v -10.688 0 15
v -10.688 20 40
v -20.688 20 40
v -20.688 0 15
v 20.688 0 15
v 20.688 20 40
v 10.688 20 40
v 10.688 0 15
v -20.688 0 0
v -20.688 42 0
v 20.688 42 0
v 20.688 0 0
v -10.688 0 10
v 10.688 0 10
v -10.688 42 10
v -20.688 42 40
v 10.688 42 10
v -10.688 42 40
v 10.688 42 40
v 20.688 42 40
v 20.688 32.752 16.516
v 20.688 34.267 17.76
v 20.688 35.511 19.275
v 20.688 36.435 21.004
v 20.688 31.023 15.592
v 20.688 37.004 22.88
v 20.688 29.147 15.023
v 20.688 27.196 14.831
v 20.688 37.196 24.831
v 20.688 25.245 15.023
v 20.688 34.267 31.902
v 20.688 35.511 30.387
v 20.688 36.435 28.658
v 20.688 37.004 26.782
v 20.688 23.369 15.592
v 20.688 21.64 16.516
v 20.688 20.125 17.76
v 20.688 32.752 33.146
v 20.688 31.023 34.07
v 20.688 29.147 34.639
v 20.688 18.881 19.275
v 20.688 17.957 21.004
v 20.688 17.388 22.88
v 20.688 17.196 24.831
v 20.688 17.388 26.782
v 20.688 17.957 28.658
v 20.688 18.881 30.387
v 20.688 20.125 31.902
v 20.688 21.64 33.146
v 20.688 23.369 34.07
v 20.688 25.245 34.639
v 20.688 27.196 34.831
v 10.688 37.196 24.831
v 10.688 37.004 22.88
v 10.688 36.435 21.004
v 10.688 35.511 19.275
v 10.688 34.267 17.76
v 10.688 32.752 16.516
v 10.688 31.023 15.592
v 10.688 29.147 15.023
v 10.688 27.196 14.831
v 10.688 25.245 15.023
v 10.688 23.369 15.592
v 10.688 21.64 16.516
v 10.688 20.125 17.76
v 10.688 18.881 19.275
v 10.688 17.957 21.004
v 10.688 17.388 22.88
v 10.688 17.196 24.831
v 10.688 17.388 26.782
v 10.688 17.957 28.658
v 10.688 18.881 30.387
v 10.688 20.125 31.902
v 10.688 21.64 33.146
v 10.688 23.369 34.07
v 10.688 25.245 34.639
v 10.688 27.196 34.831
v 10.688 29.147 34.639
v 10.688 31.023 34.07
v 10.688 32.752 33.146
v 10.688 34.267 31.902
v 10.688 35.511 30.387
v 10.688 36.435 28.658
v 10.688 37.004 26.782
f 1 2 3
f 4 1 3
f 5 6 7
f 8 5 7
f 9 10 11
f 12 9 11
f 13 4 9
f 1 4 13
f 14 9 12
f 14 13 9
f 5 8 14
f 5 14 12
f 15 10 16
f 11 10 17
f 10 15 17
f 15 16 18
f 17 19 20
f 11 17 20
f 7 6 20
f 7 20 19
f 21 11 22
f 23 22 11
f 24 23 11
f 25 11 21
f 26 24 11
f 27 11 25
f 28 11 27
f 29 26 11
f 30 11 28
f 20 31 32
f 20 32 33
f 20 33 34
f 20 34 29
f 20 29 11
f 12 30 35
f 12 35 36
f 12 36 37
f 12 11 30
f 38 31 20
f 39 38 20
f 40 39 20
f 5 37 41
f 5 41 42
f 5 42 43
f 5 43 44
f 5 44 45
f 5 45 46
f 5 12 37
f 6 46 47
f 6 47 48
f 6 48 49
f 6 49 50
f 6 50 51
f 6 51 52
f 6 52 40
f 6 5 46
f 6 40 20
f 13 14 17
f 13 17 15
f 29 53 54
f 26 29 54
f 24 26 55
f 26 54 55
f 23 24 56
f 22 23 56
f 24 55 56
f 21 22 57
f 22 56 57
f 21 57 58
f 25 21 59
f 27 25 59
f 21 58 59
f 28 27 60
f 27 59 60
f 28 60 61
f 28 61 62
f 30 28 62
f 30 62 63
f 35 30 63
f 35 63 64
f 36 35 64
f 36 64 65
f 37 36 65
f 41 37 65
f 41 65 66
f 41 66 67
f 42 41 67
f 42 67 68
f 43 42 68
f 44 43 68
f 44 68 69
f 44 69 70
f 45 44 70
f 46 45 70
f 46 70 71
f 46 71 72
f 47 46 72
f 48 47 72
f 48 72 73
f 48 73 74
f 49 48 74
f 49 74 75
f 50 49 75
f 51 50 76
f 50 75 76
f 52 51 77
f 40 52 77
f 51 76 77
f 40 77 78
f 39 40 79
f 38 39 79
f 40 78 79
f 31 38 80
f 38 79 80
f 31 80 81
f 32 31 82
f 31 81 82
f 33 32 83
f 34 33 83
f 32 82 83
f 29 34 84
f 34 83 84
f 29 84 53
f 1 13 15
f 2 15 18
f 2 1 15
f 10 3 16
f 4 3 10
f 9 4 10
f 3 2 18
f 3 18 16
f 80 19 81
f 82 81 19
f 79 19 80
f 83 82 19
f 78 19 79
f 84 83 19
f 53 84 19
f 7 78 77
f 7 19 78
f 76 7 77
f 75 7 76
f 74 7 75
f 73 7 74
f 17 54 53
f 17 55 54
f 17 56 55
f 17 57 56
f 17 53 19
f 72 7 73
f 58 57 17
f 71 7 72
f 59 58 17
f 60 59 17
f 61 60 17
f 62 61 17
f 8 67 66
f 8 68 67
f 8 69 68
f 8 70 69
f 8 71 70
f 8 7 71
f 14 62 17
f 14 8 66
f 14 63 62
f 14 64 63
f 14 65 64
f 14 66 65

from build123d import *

# Parameters (mm, degrees)
F1_DEPTH   = 42
F3_SIZE2   = 25
F3_SIZE    = 20
F3_2_SIZE2 = 25
F3_2_SIZE  = 20
F4_D       = 20
F4_DEPTH   = 20.6886382592


with BuildPart() as f1:
    # F0 (on Front) → F1 (new body)
    with BuildSketch(Plane.XZ):
        Polygon((-20.6876382592, 40), (-20.6876382592, 0), (20.6876382592, 0), (20.6876382592, 40), (10.6876382592, 40), (10.6876382592, 10), (-10.6876382592, 10), (-10.6876382592, 40), align=None)
    extrude(amount=-F1_DEPTH)

    # F3
    f3_edges = [f1.edges().sort_by_distance(p)[0] for p in [
        (-15.687638, 0, 40),
    ]]
    f3_side = f1.faces().sort_by_distance((-15.687638, 21, 40))[0]
    chamfer(f3_edges, length=F3_SIZE, length2=F3_SIZE2, reference=f3_side)

    # F3#2
    f3_2_edges = [f1.edges().sort_by_distance(p)[0] for p in [
        (15.687638, 0, 40),
    ]]
    f3_2_side = f1.faces().sort_by_distance((15.687638, 21, 40))[0]
    chamfer(f3_2_edges, length=F3_2_SIZE, length2=F3_2_SIZE2, reference=f3_2_side)

    # F4 (through all, one way)
    with BuildSketch(Plane(origin=(0, 0, 0), x_dir=(0, 1, 0), z_dir=(-1, 0, 0))):
        with Locations((27.1959491074, -24.8310826719)):
            Circle(F4_D / 2)
    extrude(amount=-F4_DEPTH, mode=Mode.SUBTRACT)


solid = f1.part
